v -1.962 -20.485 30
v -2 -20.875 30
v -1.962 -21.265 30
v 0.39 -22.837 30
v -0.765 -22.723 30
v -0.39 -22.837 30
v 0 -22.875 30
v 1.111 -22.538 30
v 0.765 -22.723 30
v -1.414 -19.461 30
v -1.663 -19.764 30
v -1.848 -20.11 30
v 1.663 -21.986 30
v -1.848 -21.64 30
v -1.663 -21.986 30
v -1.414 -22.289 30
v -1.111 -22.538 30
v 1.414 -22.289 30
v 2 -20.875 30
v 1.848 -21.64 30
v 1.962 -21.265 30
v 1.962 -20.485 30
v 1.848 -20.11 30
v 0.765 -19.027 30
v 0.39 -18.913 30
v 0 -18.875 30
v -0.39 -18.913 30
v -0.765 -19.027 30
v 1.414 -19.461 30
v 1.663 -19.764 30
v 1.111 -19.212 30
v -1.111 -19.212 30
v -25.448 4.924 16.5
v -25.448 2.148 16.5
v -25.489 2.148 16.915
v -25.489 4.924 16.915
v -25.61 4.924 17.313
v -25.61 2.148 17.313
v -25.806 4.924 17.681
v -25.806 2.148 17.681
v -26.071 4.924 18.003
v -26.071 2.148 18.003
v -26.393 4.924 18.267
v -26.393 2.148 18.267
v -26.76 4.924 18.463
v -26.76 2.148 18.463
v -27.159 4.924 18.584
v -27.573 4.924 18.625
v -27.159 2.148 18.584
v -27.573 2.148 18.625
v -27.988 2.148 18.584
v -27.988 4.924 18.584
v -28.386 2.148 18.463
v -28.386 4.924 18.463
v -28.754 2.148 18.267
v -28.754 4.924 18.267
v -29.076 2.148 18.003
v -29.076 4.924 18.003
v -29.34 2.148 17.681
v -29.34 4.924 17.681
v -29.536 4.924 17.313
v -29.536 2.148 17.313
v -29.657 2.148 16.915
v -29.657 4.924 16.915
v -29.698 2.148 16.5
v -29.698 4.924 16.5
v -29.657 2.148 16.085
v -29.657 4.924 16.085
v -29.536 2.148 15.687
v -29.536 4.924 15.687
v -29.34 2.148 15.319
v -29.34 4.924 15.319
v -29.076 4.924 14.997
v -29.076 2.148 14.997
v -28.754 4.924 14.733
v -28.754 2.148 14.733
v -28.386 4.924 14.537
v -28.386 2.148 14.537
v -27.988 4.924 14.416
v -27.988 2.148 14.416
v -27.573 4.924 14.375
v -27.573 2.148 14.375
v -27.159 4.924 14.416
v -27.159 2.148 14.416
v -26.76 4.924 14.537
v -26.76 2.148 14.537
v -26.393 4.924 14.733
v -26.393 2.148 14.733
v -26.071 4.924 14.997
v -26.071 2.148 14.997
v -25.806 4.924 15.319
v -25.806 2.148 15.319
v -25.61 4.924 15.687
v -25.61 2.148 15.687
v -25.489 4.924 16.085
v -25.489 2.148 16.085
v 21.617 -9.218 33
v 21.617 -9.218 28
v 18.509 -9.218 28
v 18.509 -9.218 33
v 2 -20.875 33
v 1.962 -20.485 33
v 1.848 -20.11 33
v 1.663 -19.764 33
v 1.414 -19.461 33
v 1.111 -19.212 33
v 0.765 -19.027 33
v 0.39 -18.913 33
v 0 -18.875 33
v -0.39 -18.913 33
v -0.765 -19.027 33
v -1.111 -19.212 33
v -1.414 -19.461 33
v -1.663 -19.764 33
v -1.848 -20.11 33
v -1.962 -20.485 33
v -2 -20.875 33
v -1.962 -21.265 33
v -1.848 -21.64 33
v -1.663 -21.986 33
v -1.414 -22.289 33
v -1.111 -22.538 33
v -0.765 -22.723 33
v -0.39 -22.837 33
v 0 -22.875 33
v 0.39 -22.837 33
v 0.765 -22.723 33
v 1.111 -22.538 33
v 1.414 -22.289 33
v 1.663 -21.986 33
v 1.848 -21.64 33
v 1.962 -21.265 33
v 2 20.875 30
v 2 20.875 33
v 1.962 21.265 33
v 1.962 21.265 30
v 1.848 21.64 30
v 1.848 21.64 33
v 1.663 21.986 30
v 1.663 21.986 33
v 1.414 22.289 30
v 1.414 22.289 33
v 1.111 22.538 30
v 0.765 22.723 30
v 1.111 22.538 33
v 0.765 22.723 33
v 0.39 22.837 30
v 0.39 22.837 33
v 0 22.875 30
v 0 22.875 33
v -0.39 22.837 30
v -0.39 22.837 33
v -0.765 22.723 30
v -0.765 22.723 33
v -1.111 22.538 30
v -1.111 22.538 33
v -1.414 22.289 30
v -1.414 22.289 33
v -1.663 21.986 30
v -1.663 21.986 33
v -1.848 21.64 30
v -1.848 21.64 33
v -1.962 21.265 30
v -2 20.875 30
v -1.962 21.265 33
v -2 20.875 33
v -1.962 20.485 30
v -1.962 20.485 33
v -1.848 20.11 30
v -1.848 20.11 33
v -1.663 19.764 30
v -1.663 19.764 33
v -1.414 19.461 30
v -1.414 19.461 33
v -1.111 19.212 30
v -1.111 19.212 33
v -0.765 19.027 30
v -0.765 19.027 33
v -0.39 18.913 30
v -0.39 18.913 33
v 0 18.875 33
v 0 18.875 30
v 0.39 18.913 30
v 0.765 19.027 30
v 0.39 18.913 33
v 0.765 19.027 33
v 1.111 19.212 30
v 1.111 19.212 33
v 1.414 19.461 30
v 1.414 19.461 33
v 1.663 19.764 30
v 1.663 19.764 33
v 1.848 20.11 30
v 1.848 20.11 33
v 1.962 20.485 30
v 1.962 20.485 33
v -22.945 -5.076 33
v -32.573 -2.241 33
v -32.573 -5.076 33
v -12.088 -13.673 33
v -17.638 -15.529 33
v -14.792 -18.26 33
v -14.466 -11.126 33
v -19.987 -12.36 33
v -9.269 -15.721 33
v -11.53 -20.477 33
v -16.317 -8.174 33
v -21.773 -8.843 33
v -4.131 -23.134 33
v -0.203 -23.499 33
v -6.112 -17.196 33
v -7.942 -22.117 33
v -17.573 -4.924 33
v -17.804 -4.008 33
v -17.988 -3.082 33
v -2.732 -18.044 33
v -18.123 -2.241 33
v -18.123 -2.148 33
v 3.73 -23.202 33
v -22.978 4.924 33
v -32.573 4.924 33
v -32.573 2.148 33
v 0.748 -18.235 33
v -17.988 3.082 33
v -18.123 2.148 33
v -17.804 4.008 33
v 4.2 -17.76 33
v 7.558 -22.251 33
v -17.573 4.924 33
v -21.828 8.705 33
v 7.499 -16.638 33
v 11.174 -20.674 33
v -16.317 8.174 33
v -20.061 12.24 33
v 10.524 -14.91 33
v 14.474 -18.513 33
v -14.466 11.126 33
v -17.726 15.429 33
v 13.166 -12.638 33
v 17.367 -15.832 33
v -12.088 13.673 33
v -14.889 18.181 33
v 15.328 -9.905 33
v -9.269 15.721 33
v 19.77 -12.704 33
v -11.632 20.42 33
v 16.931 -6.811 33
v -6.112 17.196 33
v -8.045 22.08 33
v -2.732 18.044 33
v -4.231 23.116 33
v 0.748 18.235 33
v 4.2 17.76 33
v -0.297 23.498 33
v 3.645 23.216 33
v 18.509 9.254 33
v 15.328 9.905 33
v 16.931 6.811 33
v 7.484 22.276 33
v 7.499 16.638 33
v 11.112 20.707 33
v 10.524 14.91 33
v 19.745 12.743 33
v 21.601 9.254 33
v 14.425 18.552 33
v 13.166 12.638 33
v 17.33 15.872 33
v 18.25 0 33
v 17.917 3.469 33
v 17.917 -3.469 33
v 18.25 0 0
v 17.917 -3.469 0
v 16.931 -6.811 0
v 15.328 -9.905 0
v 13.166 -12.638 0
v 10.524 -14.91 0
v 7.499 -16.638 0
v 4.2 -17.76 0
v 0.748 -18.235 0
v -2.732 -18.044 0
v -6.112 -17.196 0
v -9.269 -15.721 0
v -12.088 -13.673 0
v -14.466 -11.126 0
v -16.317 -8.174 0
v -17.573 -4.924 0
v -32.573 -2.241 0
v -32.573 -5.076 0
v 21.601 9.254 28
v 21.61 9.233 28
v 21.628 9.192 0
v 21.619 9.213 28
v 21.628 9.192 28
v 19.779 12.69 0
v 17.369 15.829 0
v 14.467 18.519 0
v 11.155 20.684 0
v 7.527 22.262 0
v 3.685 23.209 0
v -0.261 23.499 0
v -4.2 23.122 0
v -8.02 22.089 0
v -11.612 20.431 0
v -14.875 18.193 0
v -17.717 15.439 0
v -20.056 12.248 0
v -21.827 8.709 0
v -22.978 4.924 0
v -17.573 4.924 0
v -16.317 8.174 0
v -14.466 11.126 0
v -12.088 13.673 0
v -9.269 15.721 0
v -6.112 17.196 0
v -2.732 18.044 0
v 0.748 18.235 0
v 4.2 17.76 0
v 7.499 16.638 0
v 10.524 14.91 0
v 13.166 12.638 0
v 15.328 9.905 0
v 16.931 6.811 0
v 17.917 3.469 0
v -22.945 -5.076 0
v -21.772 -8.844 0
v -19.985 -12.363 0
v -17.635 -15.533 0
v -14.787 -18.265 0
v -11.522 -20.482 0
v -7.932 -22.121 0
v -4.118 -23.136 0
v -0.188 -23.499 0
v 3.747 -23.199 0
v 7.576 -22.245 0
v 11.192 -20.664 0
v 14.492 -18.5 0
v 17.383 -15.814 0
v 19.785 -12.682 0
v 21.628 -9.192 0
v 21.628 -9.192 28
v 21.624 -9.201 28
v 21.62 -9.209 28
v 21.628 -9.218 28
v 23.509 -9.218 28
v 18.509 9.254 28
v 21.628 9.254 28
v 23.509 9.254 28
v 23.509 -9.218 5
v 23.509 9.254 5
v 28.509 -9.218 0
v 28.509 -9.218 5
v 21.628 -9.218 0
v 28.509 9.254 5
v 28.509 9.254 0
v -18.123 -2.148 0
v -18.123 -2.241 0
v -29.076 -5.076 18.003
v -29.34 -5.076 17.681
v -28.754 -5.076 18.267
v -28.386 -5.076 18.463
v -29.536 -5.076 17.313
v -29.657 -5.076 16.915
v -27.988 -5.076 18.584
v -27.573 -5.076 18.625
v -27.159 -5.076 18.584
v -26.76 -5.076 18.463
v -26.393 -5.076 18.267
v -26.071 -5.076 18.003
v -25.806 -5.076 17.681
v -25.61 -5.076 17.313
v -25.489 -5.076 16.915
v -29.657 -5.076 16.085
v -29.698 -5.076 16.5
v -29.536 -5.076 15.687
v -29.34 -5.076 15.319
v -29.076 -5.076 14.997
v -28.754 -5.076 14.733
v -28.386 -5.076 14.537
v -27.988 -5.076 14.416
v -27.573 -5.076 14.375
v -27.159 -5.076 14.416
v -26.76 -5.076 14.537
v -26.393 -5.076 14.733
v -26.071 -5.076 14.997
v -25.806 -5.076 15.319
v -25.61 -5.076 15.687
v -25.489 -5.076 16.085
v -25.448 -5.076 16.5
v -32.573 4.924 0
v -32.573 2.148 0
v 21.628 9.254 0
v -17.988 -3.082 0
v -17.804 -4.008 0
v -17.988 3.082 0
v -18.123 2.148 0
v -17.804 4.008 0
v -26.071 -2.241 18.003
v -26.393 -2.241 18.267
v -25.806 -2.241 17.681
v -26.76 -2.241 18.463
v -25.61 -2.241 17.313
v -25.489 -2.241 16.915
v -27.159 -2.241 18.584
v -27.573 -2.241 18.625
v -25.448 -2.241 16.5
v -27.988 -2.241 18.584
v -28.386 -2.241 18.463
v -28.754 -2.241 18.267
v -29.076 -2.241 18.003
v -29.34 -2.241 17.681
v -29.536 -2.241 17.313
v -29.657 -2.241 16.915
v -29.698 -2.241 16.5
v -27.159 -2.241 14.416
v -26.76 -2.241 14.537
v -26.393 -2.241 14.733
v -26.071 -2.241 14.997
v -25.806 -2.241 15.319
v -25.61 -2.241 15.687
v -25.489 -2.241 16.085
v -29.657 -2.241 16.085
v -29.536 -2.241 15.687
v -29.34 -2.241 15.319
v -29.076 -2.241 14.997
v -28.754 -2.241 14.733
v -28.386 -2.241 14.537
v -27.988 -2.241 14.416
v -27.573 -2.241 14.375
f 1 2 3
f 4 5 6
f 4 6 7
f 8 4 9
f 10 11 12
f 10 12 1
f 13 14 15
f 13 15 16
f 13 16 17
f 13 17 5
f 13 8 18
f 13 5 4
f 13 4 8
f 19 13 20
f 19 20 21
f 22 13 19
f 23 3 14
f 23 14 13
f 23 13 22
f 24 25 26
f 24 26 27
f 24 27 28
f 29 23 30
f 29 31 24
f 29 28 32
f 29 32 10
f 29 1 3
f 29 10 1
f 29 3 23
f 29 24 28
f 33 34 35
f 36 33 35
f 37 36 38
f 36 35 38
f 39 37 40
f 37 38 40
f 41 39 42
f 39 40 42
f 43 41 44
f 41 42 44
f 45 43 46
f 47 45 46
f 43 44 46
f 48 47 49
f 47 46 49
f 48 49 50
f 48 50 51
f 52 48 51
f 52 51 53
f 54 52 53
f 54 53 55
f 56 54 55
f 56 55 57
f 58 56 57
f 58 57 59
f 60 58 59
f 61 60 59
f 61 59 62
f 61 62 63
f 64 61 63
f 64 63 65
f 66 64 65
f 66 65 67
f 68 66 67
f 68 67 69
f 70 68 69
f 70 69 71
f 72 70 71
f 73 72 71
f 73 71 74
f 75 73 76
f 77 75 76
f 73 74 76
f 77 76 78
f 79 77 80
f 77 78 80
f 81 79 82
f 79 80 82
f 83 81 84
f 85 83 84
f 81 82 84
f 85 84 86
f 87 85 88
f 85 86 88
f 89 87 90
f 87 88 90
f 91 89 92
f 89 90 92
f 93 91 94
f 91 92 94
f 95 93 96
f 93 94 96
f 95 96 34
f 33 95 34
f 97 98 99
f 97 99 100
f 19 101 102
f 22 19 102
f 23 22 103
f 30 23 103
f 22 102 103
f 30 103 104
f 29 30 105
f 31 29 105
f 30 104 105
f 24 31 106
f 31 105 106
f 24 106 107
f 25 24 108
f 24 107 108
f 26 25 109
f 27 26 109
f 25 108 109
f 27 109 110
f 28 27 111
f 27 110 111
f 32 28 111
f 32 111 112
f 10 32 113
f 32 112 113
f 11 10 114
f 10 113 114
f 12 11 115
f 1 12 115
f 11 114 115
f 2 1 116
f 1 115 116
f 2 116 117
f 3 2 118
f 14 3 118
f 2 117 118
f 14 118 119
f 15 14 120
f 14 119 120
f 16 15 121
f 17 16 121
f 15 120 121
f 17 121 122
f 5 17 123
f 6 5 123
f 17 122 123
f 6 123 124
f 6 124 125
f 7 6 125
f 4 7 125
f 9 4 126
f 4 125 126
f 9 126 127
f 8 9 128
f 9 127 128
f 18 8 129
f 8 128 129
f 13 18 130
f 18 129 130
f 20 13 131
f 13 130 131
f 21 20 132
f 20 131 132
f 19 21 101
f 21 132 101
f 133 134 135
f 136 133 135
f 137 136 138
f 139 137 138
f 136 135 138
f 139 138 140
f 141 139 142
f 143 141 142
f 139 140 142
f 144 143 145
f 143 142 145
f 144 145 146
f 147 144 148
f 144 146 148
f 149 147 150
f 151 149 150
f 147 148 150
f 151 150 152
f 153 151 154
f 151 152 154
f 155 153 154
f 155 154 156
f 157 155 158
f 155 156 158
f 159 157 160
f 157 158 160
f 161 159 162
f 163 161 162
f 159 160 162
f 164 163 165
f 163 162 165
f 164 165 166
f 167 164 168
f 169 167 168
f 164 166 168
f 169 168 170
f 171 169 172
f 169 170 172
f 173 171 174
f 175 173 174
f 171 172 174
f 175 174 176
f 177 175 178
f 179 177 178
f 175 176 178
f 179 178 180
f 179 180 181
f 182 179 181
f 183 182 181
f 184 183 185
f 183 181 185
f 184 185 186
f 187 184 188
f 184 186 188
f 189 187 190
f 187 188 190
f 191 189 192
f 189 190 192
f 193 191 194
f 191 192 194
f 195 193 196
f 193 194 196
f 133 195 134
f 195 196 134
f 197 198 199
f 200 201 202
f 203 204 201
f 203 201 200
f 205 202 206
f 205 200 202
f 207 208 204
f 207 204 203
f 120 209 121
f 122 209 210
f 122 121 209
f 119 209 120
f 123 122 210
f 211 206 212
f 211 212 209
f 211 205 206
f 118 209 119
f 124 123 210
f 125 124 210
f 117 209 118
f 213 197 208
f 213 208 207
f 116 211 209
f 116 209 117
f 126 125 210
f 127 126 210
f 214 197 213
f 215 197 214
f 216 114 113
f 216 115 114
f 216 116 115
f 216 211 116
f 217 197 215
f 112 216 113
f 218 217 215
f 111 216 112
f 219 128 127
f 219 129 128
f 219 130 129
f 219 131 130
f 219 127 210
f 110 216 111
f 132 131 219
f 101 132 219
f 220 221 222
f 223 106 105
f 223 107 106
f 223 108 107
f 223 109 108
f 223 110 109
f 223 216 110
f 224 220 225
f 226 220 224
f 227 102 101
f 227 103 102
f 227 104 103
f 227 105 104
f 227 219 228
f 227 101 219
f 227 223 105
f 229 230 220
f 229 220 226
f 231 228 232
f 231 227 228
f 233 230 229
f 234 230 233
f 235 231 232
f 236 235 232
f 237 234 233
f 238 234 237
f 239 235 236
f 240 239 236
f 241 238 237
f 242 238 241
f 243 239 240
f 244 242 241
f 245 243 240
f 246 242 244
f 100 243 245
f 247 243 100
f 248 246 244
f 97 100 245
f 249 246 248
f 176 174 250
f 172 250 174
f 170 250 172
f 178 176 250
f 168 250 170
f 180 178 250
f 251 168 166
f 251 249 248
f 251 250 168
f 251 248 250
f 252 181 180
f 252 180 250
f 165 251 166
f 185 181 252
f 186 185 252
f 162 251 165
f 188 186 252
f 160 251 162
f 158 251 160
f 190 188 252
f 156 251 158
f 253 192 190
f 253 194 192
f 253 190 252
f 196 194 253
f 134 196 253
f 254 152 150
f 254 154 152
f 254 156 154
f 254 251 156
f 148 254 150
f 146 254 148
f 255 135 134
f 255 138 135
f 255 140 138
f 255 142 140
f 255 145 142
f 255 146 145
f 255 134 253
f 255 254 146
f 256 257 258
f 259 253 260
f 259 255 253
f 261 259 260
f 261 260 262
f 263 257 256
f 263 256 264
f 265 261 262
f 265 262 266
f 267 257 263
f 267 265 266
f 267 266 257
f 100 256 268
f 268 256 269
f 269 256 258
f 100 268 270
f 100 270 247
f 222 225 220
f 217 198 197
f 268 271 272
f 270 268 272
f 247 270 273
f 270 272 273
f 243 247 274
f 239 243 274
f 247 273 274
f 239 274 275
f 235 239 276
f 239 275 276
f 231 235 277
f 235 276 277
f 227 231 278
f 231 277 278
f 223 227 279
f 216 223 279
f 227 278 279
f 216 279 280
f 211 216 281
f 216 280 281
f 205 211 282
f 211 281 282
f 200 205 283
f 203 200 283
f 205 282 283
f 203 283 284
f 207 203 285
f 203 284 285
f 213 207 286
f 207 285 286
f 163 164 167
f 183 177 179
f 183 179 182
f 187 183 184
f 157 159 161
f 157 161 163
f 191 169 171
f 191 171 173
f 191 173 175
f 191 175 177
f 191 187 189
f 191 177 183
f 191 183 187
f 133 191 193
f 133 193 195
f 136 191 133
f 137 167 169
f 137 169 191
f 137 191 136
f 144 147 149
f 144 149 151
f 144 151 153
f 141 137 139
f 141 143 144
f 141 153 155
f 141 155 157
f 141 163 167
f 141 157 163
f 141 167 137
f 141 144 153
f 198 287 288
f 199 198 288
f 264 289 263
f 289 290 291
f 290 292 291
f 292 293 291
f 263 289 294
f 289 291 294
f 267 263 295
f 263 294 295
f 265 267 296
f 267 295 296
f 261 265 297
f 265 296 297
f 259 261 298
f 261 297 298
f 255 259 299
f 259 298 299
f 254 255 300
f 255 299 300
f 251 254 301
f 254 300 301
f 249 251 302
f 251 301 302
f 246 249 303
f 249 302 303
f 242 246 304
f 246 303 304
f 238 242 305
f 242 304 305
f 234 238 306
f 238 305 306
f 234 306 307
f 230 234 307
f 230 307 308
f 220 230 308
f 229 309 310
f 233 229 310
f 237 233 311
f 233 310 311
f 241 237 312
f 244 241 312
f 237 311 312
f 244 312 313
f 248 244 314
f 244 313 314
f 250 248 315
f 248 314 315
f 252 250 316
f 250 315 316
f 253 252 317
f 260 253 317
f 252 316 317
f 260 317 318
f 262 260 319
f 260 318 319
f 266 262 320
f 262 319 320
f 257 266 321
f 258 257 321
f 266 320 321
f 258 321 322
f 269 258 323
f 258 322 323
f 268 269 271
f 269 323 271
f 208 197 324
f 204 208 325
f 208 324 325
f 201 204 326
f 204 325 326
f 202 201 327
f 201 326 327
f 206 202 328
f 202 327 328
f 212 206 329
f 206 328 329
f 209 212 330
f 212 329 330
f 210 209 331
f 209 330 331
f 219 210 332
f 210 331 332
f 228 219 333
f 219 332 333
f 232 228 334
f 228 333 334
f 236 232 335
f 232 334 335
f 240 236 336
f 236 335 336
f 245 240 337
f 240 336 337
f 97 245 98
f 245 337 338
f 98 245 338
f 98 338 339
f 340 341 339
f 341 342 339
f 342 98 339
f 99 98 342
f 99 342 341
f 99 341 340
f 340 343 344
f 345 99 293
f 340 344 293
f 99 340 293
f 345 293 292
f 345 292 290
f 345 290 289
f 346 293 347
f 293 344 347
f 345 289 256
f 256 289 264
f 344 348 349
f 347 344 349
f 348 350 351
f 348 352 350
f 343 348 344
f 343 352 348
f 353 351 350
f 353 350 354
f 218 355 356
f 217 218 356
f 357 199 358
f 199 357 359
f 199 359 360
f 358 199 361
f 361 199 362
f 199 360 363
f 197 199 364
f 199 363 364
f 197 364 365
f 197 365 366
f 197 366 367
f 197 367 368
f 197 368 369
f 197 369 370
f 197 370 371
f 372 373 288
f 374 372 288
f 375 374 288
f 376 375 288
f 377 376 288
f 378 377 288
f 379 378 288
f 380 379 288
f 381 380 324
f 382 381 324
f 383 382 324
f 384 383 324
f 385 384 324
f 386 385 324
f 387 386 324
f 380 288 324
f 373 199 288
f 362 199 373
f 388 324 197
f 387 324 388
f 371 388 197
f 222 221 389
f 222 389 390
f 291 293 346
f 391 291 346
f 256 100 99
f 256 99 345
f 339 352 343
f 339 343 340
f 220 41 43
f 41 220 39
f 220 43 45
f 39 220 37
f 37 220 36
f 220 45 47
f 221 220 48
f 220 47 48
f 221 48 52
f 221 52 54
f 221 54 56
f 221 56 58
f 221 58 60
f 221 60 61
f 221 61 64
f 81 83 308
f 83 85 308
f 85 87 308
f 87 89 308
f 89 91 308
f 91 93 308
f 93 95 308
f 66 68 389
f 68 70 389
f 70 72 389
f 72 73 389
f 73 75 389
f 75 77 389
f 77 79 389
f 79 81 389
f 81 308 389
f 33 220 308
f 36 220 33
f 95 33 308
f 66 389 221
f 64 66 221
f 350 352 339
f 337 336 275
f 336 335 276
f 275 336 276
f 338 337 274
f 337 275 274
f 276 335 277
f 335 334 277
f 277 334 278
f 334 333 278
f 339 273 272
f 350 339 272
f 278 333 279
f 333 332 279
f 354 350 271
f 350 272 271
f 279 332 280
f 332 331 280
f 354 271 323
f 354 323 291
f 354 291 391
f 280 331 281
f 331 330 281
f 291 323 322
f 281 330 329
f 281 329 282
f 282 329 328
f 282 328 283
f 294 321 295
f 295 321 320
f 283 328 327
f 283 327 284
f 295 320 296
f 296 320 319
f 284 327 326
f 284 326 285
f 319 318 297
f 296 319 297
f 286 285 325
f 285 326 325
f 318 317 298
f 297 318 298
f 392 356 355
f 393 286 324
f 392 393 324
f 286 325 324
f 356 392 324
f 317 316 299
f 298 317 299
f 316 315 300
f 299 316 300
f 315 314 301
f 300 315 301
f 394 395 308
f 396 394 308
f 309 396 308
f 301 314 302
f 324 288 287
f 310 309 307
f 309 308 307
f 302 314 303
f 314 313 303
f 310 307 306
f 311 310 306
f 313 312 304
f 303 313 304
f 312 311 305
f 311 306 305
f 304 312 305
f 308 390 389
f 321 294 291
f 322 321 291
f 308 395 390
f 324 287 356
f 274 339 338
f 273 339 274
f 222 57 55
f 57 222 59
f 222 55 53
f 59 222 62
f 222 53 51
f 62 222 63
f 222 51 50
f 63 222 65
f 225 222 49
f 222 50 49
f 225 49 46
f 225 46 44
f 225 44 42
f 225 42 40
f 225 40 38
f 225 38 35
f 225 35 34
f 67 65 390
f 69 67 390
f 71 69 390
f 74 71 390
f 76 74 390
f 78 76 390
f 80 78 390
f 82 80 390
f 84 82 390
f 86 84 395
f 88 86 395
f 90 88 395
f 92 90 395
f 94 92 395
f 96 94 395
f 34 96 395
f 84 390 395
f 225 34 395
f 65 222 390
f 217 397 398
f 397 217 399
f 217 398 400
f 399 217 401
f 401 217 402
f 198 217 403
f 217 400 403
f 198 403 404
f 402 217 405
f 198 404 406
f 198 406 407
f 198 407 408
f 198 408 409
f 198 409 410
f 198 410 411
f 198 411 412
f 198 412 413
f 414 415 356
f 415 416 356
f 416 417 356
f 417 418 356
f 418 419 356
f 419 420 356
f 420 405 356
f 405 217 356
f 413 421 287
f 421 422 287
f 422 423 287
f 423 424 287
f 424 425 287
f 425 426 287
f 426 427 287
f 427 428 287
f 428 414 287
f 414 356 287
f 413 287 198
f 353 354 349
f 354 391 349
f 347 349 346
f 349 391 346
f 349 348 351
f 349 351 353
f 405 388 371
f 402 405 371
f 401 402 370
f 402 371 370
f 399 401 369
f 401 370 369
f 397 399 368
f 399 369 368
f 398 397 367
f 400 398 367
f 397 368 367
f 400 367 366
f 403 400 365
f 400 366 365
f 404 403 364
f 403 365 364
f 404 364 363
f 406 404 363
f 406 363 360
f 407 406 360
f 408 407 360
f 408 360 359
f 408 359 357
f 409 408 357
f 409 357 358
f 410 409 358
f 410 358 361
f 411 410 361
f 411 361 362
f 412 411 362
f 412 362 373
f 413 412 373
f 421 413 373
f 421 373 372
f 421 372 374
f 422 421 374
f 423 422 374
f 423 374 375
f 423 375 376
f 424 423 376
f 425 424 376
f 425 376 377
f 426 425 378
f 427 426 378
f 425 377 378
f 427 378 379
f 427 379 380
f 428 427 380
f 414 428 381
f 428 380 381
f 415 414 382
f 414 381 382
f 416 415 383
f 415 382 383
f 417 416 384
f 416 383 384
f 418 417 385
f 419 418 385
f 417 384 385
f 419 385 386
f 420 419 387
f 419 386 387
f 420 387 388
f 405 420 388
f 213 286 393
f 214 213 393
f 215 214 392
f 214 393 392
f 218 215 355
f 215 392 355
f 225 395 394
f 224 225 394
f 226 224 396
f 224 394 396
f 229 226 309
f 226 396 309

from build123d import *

# Parameters (mm, degrees)
F1_DEPTH  = 33
F3_W      = 1.8808413297
F3_H      = 18.471846357
F4_DEPTH  = 33
F5_R      = 2
F6_DEPTH  = 3
F7_W      = 18.471846357
F7_H      = 5
F8_DEPTH  = 5
F9_DEPTH  = 5
F2_R      = 2.125
F10_DEPTH = 25


# Not quite as in the source:
# - a feature names something its author has since deleted; it is built from what else it names


with BuildPart() as f1:
    # F0 (on Top) → F1 (new body)
    with BuildSketch(Plane.XY):
        with BuildLine():
            ThreePointArc((-23.401635828, 2.1478921234), (-23.2315061267, 3.5421918479), (-22.9783775489, 4.9238364331))
            Line((-22.9783775489, 4.9238364331), (-32.5732277849, 4.9238364331))
            Line((-32.5732277849, 4.9238364331), (-32.5732277849, 2.1478921234))
            Line((-32.5732277849, 2.1478921234), (-23.401635828, 2.1478921234))
        make_face()
        with BuildLine():
            Line((-32.5732277849, -5.0761635669), (-22.9452078535, -5.0761635669))
            ThreePointArc((-22.9452078535, -5.0761635669), (-23.2124017724, -3.6652972535), (-23.3929275249, -2.2407458164))
            Line((-23.3929275249, -2.2407458164), (-32.5732277849, -2.2407458164))
            Line((-32.5732277849, -2.2407458164), (-32.5732277849, -5.0761635669))
        make_face()
        with BuildLine():
            ThreePointArc((-22.9452078535, -5.0761635669), (2.55319559, -23.3608902287), (23.5, 0))
            ThreePointArc((23.5, 0), (2.4756946097, 23.3692305436), (-22.9783775489, 4.9238364331))
            Line((-22.9783775489, 4.9238364331), (-17.5732277849, 4.9238364331))
            ThreePointArc((-17.5732277849, 4.9238364331), (2.4850646798, 18.080015308), (18.25, 0))
            ThreePointArc((18.25, 0), (2.4850646798, -18.080015308), (-17.5732277849, -4.9238364331))
            Line((-17.5732277849, -4.9238364331), (-17.5732277849, -5.0761635669))
            Line((-17.5732277849, -5.0761635669), (-22.9452078535, -5.0761635669))
        make_face()
        with BuildLine():
            Line((-17.5732277849, 4.9238364331), (-22.9783775489, 4.9238364331))
            ThreePointArc((-22.9783775489, 4.9238364331), (-23.2315061267, 3.5421918479), (-23.401635828, 2.1478921234))
            Line((-23.401635828, 2.1478921234), (-18.1231636153, 2.1478921234))
            ThreePointArc((-18.1231636153, 2.1478921234), (-17.9020824613, 3.5465396584), (-17.5732277849, 4.9238364331))
        make_face()
        with BuildLine():
            ThreePointArc((-23.3929275249, -2.2407458164), (-23.2124017724, -3.6652972535), (-22.9452078535, -5.0761635669))
            Line((-22.9452078535, -5.0761635669), (-17.5732277849, -5.0761635669))
            Line((-17.5732277849, -5.0761635669), (-17.5732277849, -4.9238364331))
            ThreePointArc((-17.5732277849, -4.9238364331), (-17.9020824613, -3.5465396584), (-18.1231636153, -2.1478921234))
            Line((-18.1231636153, -2.1478921234), (-18.1231636153, -2.2407458164))
            Line((-18.1231636153, -2.2407458164), (-23.3929275249, -2.2407458164))
        make_face()
    extrude(amount=F1_DEPTH)

    # F3 (on Top) → F4 (join)
    with BuildSketch(Plane.XY):
        with Locations((22.5681019947, 0.0180900097)):
            Rectangle(F3_W, F3_H)
    extrude(amount=F4_DEPTH)

    # F5 (on face) → F6 (cut)
    with BuildSketch(Plane.XY.offset(33)):
        with Locations((0, 20.875)):
            Circle(F5_R)
        with Locations((0, -20.875)):
            Circle(F5_R)
    extrude(amount=-F6_DEPTH, mode=Mode.SUBTRACT)

    # F7 (on face) → F8 (cut)
    with BuildSketch(Plane.YZ.offset(23.5085226595)):
        with Locations((0.0180900097, 30.5)):
            Rectangle(F7_W, F7_H)
    extrude(amount=-F8_DEPTH, mode=Mode.SUBTRACT)

    # F7 (on face) → F9 (join)
    with BuildSketch(Plane.YZ.offset(23.5085226595)):
        with Locations((0.0180900097, 2.5)):
            Rectangle(F7_W, F7_H)
    extrude(amount=F9_DEPTH)

    # F2 (on face) → F10 (cut)
    with BuildSketch(Plane.XZ.offset(5.0761635669)):
        with Locations((-27.5732277849, 16.5)):
            Circle(F2_R)
    extrude(amount=-F10_DEPTH, mode=Mode.SUBTRACT)


solid = f1.part
